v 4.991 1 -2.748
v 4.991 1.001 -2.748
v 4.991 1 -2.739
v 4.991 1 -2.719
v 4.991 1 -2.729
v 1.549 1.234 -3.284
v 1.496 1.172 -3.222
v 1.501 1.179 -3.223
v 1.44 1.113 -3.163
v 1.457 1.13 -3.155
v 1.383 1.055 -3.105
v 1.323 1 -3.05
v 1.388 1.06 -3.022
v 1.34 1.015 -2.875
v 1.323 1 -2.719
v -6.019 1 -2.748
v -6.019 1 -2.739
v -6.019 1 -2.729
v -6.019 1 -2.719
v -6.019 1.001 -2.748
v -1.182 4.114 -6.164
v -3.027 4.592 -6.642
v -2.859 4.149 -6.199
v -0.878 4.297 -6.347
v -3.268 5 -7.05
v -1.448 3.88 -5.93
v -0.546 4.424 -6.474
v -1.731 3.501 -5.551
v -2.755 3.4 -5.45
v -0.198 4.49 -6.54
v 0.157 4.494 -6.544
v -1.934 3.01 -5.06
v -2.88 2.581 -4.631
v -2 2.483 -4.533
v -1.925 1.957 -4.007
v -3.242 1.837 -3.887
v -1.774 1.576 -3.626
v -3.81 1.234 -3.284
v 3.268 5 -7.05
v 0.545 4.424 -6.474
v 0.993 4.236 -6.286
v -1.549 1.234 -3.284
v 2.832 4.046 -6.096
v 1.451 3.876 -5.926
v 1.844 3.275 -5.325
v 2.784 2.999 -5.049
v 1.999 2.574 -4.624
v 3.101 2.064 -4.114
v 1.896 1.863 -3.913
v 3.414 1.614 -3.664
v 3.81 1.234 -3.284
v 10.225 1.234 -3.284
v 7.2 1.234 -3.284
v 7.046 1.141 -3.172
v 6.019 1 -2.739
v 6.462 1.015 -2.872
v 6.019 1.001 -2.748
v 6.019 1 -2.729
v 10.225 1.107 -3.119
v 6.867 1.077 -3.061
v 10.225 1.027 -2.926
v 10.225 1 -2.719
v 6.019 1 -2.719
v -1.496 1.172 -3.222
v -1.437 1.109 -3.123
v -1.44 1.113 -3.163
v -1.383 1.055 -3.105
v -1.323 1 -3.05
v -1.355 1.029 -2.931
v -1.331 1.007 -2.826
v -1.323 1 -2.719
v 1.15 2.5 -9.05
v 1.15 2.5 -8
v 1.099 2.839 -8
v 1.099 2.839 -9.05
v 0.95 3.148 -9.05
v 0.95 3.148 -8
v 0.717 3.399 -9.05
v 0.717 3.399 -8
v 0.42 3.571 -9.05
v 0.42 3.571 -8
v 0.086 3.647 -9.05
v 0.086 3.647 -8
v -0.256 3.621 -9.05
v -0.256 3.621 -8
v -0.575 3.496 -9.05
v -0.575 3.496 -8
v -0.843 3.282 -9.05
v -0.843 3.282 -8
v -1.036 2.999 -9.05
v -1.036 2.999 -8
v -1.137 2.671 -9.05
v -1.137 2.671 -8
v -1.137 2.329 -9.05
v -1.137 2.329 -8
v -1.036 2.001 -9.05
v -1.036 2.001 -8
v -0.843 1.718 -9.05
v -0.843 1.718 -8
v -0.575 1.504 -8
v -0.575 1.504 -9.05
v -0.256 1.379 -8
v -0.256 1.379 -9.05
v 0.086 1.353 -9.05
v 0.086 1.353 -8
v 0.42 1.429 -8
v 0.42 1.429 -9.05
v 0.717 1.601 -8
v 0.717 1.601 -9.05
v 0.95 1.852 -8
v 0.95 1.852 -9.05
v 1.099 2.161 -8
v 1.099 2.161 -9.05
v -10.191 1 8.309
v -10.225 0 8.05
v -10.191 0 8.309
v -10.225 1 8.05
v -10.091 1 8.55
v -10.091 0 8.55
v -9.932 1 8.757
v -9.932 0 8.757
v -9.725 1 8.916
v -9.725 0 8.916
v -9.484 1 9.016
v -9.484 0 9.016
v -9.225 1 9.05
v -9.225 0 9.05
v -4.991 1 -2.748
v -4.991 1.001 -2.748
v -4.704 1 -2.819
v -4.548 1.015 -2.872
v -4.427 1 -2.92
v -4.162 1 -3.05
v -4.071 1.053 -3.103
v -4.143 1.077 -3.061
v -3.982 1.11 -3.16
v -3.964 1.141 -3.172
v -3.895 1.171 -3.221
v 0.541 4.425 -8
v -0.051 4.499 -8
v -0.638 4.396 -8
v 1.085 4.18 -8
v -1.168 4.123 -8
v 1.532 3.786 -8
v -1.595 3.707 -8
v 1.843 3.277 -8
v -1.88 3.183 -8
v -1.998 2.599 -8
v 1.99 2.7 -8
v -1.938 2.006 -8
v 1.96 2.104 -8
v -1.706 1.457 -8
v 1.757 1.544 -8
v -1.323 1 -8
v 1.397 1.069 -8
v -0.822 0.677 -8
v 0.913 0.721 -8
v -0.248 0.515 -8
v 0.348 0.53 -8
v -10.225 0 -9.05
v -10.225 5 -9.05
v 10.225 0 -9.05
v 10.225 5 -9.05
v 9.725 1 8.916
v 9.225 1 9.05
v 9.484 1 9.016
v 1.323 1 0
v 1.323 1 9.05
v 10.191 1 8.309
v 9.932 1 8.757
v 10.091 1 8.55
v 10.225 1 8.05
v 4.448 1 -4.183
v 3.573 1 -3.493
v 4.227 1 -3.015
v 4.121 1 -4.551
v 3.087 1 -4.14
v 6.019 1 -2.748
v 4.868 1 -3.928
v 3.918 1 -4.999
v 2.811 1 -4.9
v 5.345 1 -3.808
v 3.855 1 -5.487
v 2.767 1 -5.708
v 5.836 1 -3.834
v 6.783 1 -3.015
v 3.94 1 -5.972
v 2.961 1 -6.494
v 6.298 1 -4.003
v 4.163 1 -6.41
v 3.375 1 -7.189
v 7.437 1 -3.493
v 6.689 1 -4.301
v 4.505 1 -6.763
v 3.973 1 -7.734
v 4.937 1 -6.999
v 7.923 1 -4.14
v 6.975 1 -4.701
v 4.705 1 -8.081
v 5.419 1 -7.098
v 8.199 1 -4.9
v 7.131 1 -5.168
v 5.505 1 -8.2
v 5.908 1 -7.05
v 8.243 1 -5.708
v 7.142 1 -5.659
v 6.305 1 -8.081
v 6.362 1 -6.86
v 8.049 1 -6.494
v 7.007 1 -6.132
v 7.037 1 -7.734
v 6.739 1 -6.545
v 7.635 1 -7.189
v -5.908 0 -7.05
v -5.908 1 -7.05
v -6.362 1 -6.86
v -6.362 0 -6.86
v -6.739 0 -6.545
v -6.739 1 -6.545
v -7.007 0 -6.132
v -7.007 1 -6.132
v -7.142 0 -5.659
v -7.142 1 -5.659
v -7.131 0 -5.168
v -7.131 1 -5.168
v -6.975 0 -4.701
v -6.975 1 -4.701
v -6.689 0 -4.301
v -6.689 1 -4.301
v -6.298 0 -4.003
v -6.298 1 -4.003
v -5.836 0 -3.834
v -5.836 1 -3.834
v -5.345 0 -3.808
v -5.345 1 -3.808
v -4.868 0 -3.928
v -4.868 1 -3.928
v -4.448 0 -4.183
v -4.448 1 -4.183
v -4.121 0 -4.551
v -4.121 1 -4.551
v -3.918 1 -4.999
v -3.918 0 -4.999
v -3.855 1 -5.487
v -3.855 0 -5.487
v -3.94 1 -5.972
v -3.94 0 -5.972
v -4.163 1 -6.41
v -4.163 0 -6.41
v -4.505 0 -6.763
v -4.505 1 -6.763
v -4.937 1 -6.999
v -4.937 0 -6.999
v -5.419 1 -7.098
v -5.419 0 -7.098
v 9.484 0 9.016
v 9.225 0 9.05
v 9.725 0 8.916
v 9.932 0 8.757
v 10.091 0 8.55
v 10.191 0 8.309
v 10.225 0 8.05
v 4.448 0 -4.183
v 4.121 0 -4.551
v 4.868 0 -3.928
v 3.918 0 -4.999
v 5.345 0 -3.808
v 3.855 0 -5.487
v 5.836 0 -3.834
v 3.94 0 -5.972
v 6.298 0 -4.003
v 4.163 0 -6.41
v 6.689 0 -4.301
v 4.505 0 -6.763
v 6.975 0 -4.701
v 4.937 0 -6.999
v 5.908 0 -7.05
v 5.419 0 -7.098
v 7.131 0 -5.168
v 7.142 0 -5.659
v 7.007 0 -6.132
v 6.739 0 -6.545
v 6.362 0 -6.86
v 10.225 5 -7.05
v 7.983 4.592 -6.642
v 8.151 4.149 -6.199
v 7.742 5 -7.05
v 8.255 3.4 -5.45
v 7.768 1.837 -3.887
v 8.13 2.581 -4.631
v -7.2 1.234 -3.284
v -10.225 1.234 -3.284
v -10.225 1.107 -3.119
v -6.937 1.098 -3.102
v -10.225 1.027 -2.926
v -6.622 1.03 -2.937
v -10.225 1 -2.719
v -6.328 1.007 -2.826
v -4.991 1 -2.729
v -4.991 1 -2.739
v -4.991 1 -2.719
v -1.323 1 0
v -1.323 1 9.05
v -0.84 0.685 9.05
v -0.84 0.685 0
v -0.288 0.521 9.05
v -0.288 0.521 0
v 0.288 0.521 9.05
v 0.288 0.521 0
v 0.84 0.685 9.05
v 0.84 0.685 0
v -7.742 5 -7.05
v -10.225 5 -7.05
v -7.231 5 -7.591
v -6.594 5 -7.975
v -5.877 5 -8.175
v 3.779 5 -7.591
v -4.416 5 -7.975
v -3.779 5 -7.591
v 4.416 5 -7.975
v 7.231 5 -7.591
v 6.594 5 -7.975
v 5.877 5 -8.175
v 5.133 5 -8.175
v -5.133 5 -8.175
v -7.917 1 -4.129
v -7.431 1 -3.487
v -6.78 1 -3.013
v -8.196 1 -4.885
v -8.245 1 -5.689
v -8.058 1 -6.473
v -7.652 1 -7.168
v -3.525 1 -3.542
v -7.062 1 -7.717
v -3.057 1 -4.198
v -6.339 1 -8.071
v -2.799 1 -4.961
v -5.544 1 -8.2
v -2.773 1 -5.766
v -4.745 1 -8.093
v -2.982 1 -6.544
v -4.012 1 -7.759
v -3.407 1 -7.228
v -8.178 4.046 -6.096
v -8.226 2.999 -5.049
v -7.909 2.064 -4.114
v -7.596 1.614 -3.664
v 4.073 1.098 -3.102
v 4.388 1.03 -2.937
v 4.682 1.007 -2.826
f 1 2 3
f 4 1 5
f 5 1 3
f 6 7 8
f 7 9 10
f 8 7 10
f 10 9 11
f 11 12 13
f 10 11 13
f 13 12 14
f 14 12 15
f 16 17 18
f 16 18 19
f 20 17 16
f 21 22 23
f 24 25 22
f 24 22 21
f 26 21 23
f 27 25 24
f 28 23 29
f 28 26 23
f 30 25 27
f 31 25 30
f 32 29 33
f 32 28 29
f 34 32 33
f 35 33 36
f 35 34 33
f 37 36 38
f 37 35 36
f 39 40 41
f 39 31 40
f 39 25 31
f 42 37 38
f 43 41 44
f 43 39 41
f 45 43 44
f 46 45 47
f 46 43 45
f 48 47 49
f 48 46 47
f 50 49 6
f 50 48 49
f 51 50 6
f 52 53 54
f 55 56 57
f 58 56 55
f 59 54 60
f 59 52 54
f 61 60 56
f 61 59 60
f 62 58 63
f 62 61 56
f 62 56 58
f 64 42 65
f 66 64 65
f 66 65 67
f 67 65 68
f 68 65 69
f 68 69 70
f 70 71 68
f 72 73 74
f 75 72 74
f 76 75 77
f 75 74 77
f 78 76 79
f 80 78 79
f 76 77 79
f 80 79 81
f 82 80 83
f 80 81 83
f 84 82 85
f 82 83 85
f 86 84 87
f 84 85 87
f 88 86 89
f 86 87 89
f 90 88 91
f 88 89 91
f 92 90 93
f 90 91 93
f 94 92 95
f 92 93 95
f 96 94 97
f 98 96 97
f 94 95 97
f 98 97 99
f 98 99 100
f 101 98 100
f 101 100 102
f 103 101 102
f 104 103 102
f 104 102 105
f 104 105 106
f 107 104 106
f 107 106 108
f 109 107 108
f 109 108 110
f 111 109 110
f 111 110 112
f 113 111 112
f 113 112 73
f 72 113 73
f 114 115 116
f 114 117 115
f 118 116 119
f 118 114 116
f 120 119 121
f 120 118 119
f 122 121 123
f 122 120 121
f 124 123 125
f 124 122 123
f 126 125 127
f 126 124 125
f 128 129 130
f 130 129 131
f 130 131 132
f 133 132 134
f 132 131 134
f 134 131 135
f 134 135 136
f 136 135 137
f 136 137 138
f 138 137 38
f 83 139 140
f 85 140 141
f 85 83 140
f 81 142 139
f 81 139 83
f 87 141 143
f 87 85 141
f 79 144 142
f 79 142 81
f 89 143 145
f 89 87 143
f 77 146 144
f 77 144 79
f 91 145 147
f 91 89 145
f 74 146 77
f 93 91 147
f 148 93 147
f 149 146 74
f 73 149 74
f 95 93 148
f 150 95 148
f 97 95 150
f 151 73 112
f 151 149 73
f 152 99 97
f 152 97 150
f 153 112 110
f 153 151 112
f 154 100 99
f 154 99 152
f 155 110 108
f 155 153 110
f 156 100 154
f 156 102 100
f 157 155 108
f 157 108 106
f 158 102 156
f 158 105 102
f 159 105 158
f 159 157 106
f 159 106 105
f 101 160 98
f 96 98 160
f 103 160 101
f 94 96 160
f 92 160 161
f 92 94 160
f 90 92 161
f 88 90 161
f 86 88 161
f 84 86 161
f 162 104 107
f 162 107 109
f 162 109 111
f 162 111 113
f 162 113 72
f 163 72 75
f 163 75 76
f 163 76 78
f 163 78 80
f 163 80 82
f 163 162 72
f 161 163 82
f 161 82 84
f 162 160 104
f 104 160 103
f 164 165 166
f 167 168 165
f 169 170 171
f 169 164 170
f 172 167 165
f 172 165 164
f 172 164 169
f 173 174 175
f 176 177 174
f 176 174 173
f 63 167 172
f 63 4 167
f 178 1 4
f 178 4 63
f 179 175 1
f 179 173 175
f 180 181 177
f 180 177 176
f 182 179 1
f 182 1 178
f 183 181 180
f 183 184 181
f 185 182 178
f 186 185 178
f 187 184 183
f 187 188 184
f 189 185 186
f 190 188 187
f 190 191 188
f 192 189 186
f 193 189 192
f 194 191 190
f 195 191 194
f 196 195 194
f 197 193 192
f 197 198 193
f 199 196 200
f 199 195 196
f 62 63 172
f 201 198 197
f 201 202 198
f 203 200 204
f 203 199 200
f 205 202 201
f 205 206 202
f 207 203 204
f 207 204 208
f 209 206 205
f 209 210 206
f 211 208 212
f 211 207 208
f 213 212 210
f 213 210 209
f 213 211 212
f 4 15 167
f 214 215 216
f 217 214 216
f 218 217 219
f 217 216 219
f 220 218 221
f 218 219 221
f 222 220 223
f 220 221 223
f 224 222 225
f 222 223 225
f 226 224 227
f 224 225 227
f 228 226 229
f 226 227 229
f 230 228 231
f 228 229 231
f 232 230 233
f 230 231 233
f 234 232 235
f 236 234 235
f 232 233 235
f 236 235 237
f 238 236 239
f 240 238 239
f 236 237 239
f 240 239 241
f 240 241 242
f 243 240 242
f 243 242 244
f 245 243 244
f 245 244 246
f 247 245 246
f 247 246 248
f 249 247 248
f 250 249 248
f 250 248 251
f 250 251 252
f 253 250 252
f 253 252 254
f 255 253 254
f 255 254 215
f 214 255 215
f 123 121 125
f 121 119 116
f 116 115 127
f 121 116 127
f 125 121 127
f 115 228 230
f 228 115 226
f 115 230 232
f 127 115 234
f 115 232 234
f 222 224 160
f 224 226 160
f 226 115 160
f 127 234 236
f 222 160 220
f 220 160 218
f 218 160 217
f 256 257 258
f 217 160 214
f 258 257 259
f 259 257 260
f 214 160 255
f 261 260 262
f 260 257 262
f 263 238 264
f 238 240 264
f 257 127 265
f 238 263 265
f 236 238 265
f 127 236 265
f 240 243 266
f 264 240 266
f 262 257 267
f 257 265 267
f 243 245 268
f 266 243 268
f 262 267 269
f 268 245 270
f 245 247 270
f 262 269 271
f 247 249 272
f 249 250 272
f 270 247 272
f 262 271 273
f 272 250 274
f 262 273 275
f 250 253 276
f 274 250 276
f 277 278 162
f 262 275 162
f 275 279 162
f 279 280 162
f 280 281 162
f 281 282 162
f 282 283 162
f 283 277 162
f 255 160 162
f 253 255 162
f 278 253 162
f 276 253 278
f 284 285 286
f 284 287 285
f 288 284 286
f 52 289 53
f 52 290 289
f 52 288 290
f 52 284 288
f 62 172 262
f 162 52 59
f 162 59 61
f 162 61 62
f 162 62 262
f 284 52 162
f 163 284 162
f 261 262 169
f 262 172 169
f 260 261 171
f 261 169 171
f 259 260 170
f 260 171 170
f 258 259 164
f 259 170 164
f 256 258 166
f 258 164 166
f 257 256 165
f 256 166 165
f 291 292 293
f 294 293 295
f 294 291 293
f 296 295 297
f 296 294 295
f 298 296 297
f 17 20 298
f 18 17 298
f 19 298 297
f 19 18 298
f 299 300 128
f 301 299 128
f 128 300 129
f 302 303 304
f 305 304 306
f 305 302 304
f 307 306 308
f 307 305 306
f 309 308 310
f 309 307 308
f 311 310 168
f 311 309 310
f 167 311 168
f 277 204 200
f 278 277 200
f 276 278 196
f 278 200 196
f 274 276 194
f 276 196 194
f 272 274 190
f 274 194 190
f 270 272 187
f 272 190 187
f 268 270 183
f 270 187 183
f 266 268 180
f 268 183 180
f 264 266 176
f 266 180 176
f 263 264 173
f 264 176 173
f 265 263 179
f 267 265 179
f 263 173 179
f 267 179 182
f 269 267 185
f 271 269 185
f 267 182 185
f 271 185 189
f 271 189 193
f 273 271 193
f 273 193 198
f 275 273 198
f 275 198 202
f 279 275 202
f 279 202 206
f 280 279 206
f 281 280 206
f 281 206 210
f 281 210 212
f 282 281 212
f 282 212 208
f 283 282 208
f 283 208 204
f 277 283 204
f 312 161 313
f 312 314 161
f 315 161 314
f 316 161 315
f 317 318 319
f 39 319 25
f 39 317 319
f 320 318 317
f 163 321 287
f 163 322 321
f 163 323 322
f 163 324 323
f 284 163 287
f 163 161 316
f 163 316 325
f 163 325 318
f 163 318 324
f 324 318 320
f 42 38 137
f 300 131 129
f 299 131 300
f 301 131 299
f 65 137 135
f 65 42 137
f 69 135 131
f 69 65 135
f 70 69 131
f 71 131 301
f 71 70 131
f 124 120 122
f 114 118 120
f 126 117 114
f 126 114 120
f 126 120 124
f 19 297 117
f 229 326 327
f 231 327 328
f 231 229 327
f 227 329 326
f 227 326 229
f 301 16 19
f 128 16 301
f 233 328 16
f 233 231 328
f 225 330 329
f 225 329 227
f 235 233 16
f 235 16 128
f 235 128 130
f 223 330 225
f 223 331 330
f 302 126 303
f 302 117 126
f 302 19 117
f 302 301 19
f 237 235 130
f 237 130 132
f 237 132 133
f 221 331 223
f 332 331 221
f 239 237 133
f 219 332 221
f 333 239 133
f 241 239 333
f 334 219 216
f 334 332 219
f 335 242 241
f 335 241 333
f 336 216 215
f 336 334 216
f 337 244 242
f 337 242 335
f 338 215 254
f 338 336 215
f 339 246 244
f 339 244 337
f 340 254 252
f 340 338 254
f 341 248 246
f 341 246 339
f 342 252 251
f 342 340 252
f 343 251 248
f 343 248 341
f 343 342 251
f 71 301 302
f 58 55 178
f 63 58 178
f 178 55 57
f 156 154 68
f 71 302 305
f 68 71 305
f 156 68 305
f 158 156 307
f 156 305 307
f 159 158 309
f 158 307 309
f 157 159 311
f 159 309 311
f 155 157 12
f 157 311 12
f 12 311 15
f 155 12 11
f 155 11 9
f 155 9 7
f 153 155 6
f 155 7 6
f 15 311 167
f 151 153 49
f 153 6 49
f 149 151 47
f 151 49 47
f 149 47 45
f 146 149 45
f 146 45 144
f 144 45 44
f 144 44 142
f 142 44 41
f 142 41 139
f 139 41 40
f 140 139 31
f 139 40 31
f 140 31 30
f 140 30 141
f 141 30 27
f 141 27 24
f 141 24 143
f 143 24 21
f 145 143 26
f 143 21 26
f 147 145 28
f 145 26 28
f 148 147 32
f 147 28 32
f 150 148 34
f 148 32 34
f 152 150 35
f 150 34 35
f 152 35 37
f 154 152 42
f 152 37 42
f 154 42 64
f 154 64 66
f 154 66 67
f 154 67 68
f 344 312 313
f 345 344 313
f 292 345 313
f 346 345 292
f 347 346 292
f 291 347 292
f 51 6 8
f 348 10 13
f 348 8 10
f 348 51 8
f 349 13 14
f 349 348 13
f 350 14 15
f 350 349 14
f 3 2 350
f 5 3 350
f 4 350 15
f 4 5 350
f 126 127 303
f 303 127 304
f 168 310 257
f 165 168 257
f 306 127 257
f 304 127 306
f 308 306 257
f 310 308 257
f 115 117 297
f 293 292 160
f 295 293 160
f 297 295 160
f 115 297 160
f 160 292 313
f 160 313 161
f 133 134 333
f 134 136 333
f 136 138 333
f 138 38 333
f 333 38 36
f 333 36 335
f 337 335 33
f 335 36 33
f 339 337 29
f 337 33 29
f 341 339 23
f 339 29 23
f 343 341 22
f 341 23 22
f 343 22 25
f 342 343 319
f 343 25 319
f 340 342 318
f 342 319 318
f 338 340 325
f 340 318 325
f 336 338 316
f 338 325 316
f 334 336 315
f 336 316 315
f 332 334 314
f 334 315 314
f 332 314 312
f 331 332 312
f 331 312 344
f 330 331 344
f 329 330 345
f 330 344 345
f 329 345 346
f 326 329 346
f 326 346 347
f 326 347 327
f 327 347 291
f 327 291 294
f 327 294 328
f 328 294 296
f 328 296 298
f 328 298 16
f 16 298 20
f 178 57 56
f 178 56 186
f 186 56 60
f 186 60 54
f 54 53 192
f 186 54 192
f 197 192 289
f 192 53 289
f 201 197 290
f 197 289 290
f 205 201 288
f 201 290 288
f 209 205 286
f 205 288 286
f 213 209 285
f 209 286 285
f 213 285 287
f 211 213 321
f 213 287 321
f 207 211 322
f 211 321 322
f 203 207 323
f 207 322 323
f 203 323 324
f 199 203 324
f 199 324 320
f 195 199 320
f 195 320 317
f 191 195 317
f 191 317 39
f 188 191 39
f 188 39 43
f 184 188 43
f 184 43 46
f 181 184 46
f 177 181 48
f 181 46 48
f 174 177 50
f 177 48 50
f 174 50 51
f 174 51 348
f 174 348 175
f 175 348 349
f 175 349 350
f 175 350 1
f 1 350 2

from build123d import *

# Parameters (mm, degrees)
SKETCH1_W                       = 20.45
SKETCH1_H                       = 18.1
BOSS_EXTRUDE2_DEPTH             = 1
BOSS_EXTRUDE3_REACH             = 15.691
BOSS_EXTRUDE3_DIRECTION_2_REACH = 15.691
SKETCH4_R                       = 1.65
CUT_EXTRUDE1_DEPTH              = 5
SKETCH6_R                       = 2.75
CUT_EXTRUDE2_DEPTH              = 4
SKETCH7_R                       = 1.15
CUT_EXTRUDE3_DEPTH              = 9.05
SKETCH8_R                       = 2
CUT_EXTRUDE4_DEPTH              = 8
CUT_EXTRUDE4_DIRECTION_2_REACH  = 16.541
FILLET2_R                       = 1
FILLET3_R                       = 0.8


with BuildPart() as part:
    # Sketch1 → Boss-Extrude2 (new body)
    with BuildSketch(Plane(origin=(0, 0, 0), x_dir=(1, 0, 0), z_dir=(0, 1, 0))):
        Rectangle(SKETCH1_W, SKETCH1_H)
    extrude(amount=BOSS_EXTRUDE2_DEPTH)

    # Boss-Extrude3: up to this face of the body (flat: up to its plane)
    boss_extrude3_end = Plane(part.part.faces().sort_by_distance((10.225, 0.5, 0))[0])
    # Sketch3 → Boss-Extrude3 (add, up to the picked face)
    with BuildSketch(Plane(origin=(0, 0, 0), x_dir=(0, 0, -1), z_dir=(1, 0, 0)), mode=Mode.PRIVATE) as boss_extrude3_sk1:
        Polygon((9.05, 1), (9.05, 5), (7.05, 5), (3.05, 1), align=None)
    boss_extrude3_tool1 = split(extrude(boss_extrude3_sk1.sketch, amount=BOSS_EXTRUDE3_REACH, mode=Mode.PRIVATE), bisect_by=boss_extrude3_end, keep=Keep.BOTH, mode=Mode.PRIVATE)
    add(boss_extrude3_tool1.solids().sort_by(Axis((0, 2.666667, -6.883333), (1, 0, 0)))[0])

    # Boss-Extrude3 direction 2: up to this face of the body (flat: up to its plane)
    boss_extrude3_direction_2_end = Plane(part.part.faces().sort_by_distance((-10.225, 0.5, 0))[0])
    # Sketch3 → Boss-Extrude3 direction 2 (add, up to the picked face)
    with BuildSketch(Plane(origin=(0, 0, 0), x_dir=(0, 0, -1), z_dir=(1, 0, 0)), mode=Mode.PRIVATE) as boss_extrude3_direction_2_sk1:
        Polygon((9.05, 1), (9.05, 5), (7.05, 5), (3.05, 1), align=None)
    boss_extrude3_direction_2_tool1 = split(extrude(boss_extrude3_direction_2_sk1.sketch, amount=-BOSS_EXTRUDE3_DIRECTION_2_REACH, mode=Mode.PRIVATE), bisect_by=boss_extrude3_direction_2_end, keep=Keep.BOTH, mode=Mode.PRIVATE)
    add(boss_extrude3_direction_2_tool1.solids().sort_by(Axis((0, 2.666667, -6.883333), (-1, 0, 0)))[0])

    # Sketch4 → Cut-Extrude1 (cut)
    with BuildSketch(Plane(origin=(0, 5, 0), x_dir=(1, 0, 0), z_dir=(0, 1, 0))):
        with Locations(Location((-5.505, 5.45, 0), (0, 0, 104.141110234))):
            Circle(SKETCH4_R)
        with Locations(Location((5.505, 5.45, 0), (0, 0, 75.858889766))):
            Circle(SKETCH4_R)
    extrude(amount=-CUT_EXTRUDE1_DEPTH, mode=Mode.SUBTRACT)

    # Sketch6 → Cut-Extrude2 (cut)
    with BuildSketch(Plane(origin=(0, 5, 0), x_dir=(1, 0, 0), z_dir=(0, 1, 0))):
        with Locations((-5.505, 5.45)):
            Circle(SKETCH6_R)
        with Locations((5.505, 5.45)):
            Circle(SKETCH6_R)
    extrude(amount=-CUT_EXTRUDE2_DEPTH, mode=Mode.SUBTRACT)

    # Sketch7 → Cut-Extrude3 (cut)
    with BuildSketch(Plane.XY):
        with Locations((0, 2.5)):
            Circle(SKETCH7_R)
    extrude(amount=-CUT_EXTRUDE3_DEPTH, mode=Mode.SUBTRACT)

    # Sketch8 → Cut-Extrude4 (cut)
    with BuildSketch(Plane.XY):
        with Locations(Location((0, 2.5, 0), (0, 0, 228.590377891))):
            Circle(SKETCH8_R)
    extrude(amount=-CUT_EXTRUDE4_DEPTH, mode=Mode.SUBTRACT)

    # Cut-Extrude4 direction 2: up to this face of the body (flat: up to its plane)
    cut_extrude4_direction_2_end = Plane(part.part.faces().sort_by_distance((0, 0.5, 9.05))[0])
    # Sketch8 → Cut-Extrude4 direction 2 (cut, up to the picked face)
    with BuildSketch(Plane.XY, mode=Mode.PRIVATE) as cut_extrude4_direction_2_sk1:
        with Locations(Location((0, 2.5, 0), (0, 0, 228.590377891))):
            Circle(SKETCH8_R)
    cut_extrude4_direction_2_tool1 = split(extrude(cut_extrude4_direction_2_sk1.sketch, amount=CUT_EXTRUDE4_DIRECTION_2_REACH, mode=Mode.PRIVATE), bisect_by=cut_extrude4_direction_2_end, keep=Keep.BOTH, mode=Mode.PRIVATE)
    add(cut_extrude4_direction_2_tool1.solids().sort_by(Axis((0, 2.5, 0), (0, 0, 1)))[0], mode=Mode.SUBTRACT)

    # Fillet2
    fillet2_edges = [part.edges().sort_by_distance(p)[0] for p in [
        (10.225, 0.5, 9.05),
        (-10.225, 0.5, 9.05),
    ]]
    fillet(fillet2_edges, radius=FILLET2_R)

    # Fillet3
    # the kernel refuses this fillet: 0.8 mm, written as the material it adds along each edge
    with BuildSketch(Plane(origin=(-6.019145033, 1, -3.05), x_dir=(0, 0, 1), z_dir=(-1, 0, 0))) as fillet3_piece_1_section:
        with BuildLine():
            CenterArc((FILLET3_R * 0.414213562373, FILLET3_R), FILLET3_R, 225, 45)
            Line((-FILLET3_R * 0.292893218813, FILLET3_R * 0.292893218813), (0, 0))
            Line((0, 0), (FILLET3_R * 0.414213562373, 0))
        make_face()
    fillet3_piece_1 = extrude(amount=4.205854967, mode=Mode.PRIVATE)
    fillet3_piece_1 = fillet3_piece_1 - Plane(origin=(-5.505, 1.04586757, -5.45), x_dir=(1, 0, 0), z_dir=(0, 1, 0)) * Cylinder(2.75, 10, mode=Mode.PRIVATE)
    add(fillet3_piece_1)
    with BuildSketch(Plane(origin=(-0.494448531, 1, -3.05), x_dir=(0, 0, 1), z_dir=(-1, 0, 0))) as fillet3_piece_2_section:
        with BuildLine():
            CenterArc((FILLET3_R * 0.414213562373, FILLET3_R), FILLET3_R, 225, 45)
            Line((-FILLET3_R * 0.292893218813, FILLET3_R * 0.292893218813), (0, 0))
            Line((0, 0), (FILLET3_R * 0.414213562373, 0))
        make_face()
    fillet3_piece_2 = extrude(amount=4.496406436, mode=Mode.PRIVATE)
    fillet3_piece_2 = fillet3_piece_2 - Plane(origin=(-5.505, 1.043873753, -5.45), x_dir=(1, 0, 0), z_dir=(0, 1, 0)) * Cylinder(2.75, 11, mode=Mode.PRIVATE)
    fillet3_piece_2 = fillet3_piece_2 - Plane(origin=(0, 2.5, -3.015215502), x_dir=(-0.6614378277626023, -0.7500000000031267, 0), z_dir=(0, 0, 1)) * Cylinder(2, 11, mode=Mode.PRIVATE)
    add(fillet3_piece_2)
    with BuildSketch(Plane(origin=(4.990854967, 1, -3.05), x_dir=(0, 0.7071067811865468, -0.7071067811865482), z_dir=(-1, 0, 0))) as fillet3_piece_3_section:
        with BuildLine():
            CenterArc((FILLET3_R * 0.414213562373, -FILLET3_R), FILLET3_R, 90, 45)
            Line((-FILLET3_R * 0.292893218813, -FILLET3_R * 0.292893218813), (0, 0))
            Line((0, 0), (FILLET3_R * 0.414213562373, 0))
        make_face()
    fillet3_piece_3 = extrude(amount=4.496406436, mode=Mode.PRIVATE)
    fillet3_piece_3 = fillet3_piece_3 - Plane(origin=(0, 2.5, -3.015215403), x_dir=(-0.6614378277626023, -0.7500000000031267, 0), z_dir=(0, 0, 1)) * Cylinder(2, 11, mode=Mode.PRIVATE)
    fillet3_piece_3 = fillet3_piece_3 - Plane(origin=(5.505, 1.043873896, -5.45), x_dir=(1, 0, 0), z_dir=(0, 1, 0)) * Cylinder(2.75, 11, mode=Mode.PRIVATE)
    add(fillet3_piece_3)
    with BuildSketch(Plane(origin=(10.225, 1, -3.05), x_dir=(0, 0, 1), z_dir=(-1, 0, 0))) as fillet3_piece_4_section:
        with BuildLine():
            CenterArc((FILLET3_R * 0.414213562373, FILLET3_R), FILLET3_R, 225, 45)
            Line((-FILLET3_R * 0.292893218813, FILLET3_R * 0.292893218813), (0, 0))
            Line((0, 0), (FILLET3_R * 0.414213562373, 0))
        make_face()
    fillet3_piece_4 = extrude(amount=4.205854967, mode=Mode.PRIVATE)
    fillet3_piece_4 = fillet3_piece_4 - Plane(origin=(5.505, 1.045867594, -5.45), x_dir=(1, 0, 0), z_dir=(0, 1, 0)) * Cylinder(2.75, 10, mode=Mode.PRIVATE)
    add(fillet3_piece_4)


solid = part.part
